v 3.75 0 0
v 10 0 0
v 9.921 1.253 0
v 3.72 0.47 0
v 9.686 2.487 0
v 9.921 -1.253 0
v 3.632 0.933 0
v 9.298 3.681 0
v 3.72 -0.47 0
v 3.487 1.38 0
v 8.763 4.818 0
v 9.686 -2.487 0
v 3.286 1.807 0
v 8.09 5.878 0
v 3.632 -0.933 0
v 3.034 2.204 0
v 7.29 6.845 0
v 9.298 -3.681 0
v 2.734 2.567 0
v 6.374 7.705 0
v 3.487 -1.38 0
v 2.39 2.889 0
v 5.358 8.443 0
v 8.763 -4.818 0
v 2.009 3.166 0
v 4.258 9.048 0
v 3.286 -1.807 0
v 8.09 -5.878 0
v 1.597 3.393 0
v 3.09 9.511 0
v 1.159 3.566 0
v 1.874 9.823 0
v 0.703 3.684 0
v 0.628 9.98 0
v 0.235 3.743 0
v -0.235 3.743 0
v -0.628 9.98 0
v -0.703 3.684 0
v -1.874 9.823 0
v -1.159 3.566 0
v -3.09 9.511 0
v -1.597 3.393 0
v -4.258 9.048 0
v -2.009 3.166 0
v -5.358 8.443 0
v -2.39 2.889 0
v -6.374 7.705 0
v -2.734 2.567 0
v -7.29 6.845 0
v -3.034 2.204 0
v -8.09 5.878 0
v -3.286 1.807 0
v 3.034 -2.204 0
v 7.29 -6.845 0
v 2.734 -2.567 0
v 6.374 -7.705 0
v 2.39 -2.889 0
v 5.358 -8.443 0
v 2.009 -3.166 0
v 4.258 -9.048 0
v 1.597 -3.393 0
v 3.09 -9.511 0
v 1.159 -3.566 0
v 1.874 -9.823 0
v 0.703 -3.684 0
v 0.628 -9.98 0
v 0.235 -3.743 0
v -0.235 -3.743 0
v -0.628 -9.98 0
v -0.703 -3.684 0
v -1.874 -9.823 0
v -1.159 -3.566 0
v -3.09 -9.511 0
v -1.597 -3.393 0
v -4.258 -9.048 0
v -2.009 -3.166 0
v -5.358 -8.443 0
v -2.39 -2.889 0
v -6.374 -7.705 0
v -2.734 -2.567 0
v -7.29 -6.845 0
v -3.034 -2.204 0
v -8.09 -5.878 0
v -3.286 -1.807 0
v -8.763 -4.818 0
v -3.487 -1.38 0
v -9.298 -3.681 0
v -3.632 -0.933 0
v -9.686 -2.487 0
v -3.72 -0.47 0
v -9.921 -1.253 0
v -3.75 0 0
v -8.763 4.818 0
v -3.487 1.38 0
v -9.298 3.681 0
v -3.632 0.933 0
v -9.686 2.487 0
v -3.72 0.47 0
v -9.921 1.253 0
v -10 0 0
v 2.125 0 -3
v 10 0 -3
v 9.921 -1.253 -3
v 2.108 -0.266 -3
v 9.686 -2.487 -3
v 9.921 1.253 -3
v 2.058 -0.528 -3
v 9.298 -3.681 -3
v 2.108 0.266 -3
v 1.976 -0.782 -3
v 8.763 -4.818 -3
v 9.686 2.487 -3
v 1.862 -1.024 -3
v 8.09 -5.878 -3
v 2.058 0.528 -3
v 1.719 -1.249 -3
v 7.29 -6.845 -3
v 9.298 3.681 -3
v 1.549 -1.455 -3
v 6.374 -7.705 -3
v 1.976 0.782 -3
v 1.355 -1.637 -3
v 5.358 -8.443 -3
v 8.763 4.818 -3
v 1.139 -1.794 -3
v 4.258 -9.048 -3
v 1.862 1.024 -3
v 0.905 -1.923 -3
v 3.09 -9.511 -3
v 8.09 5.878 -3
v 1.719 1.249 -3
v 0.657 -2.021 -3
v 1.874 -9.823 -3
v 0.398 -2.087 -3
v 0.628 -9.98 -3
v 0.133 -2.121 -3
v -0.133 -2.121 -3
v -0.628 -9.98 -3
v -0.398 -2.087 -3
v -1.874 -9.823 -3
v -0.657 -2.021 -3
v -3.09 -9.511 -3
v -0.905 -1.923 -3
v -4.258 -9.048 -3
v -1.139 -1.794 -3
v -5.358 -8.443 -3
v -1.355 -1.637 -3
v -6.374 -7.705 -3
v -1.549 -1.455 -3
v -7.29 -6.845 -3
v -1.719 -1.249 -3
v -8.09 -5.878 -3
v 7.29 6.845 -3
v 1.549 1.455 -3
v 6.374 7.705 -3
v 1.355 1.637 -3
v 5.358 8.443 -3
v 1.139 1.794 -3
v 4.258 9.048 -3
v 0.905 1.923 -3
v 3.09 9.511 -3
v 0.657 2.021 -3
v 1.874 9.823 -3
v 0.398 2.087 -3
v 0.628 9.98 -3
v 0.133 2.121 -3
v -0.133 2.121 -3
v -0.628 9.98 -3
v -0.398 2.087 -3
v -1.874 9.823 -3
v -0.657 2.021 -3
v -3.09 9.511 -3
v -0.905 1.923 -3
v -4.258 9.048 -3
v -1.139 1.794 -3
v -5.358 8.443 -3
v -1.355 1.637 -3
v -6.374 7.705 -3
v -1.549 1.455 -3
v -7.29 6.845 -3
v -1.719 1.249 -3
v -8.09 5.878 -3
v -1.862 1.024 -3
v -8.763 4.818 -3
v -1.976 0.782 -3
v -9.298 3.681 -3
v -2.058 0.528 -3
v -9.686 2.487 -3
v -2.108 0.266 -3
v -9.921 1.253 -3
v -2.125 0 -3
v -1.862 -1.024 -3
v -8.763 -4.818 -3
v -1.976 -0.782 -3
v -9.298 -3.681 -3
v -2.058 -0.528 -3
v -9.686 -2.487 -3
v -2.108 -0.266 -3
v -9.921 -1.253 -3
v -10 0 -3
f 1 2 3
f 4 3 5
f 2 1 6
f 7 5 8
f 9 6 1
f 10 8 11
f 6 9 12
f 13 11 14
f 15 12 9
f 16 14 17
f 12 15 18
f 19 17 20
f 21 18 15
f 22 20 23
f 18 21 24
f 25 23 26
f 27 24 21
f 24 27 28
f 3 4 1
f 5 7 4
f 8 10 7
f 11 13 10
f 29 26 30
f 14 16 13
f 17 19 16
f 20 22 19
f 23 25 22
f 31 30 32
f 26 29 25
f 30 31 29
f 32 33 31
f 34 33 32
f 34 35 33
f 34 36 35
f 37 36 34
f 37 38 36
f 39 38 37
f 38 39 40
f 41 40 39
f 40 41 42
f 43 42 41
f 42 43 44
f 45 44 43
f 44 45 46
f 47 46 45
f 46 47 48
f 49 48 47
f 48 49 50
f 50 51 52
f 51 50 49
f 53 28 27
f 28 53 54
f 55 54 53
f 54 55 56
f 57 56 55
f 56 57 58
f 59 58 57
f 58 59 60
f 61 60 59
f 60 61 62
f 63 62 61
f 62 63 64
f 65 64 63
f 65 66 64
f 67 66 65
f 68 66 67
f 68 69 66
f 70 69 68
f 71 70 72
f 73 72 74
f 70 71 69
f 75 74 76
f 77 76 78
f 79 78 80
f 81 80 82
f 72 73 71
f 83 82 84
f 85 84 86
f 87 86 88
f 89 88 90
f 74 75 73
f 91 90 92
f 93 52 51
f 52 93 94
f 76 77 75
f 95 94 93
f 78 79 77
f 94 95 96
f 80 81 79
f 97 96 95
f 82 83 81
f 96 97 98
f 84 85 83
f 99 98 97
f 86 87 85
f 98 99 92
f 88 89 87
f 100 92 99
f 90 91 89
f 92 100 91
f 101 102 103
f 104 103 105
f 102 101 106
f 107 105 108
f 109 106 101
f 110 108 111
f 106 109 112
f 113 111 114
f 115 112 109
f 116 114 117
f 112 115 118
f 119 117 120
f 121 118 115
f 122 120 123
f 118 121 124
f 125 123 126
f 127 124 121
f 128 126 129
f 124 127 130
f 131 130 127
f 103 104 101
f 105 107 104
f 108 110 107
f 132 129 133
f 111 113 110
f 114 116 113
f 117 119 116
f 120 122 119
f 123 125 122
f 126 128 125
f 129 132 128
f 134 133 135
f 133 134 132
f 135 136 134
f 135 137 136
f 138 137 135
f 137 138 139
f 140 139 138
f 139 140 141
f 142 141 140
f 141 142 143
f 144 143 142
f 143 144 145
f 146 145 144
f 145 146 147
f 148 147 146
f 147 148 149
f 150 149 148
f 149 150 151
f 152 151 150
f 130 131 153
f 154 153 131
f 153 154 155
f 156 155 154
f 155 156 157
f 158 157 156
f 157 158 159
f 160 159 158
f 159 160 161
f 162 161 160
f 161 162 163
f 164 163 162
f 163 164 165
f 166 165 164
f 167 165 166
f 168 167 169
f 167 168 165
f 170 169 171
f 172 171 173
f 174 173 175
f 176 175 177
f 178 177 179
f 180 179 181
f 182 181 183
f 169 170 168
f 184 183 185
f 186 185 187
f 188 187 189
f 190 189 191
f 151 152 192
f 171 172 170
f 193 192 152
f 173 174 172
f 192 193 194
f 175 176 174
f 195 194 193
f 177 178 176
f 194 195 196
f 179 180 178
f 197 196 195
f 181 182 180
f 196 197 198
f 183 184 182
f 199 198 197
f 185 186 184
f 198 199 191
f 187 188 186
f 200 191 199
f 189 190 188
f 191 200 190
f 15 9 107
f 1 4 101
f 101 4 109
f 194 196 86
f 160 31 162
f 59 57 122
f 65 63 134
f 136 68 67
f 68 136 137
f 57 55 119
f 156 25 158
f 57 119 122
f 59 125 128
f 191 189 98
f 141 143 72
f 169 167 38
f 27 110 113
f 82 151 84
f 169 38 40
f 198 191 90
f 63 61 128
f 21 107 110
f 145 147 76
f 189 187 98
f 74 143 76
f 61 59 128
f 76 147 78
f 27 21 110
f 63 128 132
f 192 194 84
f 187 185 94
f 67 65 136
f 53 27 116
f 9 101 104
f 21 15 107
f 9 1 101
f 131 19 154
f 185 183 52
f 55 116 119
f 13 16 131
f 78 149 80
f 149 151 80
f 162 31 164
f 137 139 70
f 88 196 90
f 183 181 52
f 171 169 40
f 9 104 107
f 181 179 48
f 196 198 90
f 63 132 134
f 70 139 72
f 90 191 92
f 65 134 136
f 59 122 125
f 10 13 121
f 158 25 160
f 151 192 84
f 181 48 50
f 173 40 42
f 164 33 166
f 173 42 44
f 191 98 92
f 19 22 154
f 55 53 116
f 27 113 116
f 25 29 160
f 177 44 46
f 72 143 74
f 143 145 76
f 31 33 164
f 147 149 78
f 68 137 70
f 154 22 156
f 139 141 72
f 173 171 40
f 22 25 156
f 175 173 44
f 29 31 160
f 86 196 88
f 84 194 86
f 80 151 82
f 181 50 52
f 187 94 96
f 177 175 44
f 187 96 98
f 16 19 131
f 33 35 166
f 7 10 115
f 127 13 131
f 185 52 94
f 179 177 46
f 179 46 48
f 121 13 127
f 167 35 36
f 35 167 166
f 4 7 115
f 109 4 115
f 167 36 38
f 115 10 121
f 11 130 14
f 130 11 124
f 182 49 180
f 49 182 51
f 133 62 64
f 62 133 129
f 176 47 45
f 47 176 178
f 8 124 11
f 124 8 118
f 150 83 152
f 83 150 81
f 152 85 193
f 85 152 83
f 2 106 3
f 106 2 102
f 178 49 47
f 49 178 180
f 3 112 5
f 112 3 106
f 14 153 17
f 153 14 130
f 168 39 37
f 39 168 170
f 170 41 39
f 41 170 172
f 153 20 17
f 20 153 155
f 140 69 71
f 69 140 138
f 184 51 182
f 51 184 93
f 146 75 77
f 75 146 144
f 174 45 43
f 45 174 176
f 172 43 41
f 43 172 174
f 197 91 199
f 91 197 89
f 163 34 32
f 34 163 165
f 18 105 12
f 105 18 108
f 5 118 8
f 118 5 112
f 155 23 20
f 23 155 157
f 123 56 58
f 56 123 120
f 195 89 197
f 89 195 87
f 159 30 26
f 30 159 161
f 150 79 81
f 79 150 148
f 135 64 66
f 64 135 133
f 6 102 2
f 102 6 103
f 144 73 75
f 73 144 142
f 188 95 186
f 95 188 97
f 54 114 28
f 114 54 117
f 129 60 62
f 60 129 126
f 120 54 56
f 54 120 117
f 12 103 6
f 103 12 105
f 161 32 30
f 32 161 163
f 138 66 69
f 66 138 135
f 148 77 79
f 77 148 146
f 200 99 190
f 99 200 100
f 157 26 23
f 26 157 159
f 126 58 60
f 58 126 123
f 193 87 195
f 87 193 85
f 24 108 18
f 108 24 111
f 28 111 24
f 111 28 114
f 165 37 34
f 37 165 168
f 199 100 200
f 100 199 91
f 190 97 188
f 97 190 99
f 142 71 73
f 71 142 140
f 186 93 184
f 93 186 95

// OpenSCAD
$fn = 50;


difference() {
	union() {
		translate(v = [0, 0, -3.0000000000]) {
			cylinder(h = 3, r = 10.0000000000);
		}
		cylinder(h = 0, r = 13.0000000000);
	}
	union() {
		translate(v = [0, 0, 0]) {
			rotate(a = [0, 0, 0]) {
				difference() {
					union() {
						#translate(v = [0, 0, -3.0000000000]) {
							cylinder(h = 3, r = 2.0000000000);
						}
						#translate(v = [0, 0, -3]) {
							cylinder(h = 3, r1 = 2.1250000000, r2 = 3.7500000000);
						}
						#translate(v = [0, 0, -3.0000000000]) {
							cylinder(h = 3, r = 2.1250000000);
						}
						#translate(v = [0, 0, -3.0000000000]) {
							cylinder(h = 3, r = 2.0000000000);
						}
					}
					union();
				}
			}
		}
	}
}
